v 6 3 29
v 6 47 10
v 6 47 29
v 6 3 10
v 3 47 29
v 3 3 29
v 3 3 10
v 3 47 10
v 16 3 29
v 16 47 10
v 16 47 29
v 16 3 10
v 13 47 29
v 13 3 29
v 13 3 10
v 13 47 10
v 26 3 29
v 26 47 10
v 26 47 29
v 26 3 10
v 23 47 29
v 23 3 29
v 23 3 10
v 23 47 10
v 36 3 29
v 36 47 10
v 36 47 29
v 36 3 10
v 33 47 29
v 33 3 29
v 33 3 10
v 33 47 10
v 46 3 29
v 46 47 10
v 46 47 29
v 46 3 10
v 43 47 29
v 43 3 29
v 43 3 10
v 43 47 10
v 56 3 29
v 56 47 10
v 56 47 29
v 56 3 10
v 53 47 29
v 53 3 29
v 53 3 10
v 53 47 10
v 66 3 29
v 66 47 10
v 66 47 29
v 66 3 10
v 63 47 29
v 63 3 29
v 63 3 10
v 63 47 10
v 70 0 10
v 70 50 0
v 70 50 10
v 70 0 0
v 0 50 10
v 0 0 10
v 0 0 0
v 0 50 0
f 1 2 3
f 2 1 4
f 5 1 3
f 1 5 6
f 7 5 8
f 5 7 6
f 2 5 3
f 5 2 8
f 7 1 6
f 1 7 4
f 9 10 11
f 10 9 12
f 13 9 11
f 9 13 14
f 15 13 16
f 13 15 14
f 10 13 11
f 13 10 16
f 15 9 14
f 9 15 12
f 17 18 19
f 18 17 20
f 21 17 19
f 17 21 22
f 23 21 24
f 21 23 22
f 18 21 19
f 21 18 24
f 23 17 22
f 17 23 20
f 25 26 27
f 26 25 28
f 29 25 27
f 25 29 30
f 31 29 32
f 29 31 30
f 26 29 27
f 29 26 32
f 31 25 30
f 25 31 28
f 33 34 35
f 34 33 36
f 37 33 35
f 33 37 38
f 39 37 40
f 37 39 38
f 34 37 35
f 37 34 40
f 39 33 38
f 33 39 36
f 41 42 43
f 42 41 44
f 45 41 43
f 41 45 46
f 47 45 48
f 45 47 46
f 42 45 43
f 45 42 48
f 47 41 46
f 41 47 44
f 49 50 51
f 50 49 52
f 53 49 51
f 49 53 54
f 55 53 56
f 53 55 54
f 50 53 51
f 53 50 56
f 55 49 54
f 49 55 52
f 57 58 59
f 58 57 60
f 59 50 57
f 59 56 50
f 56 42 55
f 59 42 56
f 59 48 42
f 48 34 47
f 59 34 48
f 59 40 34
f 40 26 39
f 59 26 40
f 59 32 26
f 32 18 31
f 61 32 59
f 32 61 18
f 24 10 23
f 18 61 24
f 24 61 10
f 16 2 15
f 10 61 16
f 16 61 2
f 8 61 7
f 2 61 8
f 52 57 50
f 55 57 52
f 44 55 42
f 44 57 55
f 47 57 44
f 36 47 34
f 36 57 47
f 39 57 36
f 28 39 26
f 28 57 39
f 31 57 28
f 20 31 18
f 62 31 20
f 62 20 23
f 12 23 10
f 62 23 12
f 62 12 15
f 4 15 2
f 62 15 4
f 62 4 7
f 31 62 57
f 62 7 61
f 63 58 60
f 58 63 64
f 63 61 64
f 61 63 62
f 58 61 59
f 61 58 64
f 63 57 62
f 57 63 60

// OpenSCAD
$fn = 32;

// ----------------------------------------------------------------------
// Heatsink: uniform fin block
// ----------------------------------------------------------------------

// --- parameters (mm) ---
base_l = 70;              // base length, X
base_w = 50;              // base width, Y
base_t = 10;              // base plate thickness
fin_h = 20;               // fin height above the base
fin_t = 3;                // fin thickness
edge = 3;                 // margin from the base ends
pitch = 10;               // fin pitch

n_fins = floor((base_l - 2 * edge - fin_t) / pitch) + 1;  // fin count
total_h = base_t + fin_h - 1;  // overall height

union() {
  cube([base_l, base_w, base_t]);
  for (i = [0 : n_fins - 1])
    translate([edge + i * pitch, edge, base_t - 1])
      cube([fin_t, base_w - 2 * edge, fin_h]);
}
